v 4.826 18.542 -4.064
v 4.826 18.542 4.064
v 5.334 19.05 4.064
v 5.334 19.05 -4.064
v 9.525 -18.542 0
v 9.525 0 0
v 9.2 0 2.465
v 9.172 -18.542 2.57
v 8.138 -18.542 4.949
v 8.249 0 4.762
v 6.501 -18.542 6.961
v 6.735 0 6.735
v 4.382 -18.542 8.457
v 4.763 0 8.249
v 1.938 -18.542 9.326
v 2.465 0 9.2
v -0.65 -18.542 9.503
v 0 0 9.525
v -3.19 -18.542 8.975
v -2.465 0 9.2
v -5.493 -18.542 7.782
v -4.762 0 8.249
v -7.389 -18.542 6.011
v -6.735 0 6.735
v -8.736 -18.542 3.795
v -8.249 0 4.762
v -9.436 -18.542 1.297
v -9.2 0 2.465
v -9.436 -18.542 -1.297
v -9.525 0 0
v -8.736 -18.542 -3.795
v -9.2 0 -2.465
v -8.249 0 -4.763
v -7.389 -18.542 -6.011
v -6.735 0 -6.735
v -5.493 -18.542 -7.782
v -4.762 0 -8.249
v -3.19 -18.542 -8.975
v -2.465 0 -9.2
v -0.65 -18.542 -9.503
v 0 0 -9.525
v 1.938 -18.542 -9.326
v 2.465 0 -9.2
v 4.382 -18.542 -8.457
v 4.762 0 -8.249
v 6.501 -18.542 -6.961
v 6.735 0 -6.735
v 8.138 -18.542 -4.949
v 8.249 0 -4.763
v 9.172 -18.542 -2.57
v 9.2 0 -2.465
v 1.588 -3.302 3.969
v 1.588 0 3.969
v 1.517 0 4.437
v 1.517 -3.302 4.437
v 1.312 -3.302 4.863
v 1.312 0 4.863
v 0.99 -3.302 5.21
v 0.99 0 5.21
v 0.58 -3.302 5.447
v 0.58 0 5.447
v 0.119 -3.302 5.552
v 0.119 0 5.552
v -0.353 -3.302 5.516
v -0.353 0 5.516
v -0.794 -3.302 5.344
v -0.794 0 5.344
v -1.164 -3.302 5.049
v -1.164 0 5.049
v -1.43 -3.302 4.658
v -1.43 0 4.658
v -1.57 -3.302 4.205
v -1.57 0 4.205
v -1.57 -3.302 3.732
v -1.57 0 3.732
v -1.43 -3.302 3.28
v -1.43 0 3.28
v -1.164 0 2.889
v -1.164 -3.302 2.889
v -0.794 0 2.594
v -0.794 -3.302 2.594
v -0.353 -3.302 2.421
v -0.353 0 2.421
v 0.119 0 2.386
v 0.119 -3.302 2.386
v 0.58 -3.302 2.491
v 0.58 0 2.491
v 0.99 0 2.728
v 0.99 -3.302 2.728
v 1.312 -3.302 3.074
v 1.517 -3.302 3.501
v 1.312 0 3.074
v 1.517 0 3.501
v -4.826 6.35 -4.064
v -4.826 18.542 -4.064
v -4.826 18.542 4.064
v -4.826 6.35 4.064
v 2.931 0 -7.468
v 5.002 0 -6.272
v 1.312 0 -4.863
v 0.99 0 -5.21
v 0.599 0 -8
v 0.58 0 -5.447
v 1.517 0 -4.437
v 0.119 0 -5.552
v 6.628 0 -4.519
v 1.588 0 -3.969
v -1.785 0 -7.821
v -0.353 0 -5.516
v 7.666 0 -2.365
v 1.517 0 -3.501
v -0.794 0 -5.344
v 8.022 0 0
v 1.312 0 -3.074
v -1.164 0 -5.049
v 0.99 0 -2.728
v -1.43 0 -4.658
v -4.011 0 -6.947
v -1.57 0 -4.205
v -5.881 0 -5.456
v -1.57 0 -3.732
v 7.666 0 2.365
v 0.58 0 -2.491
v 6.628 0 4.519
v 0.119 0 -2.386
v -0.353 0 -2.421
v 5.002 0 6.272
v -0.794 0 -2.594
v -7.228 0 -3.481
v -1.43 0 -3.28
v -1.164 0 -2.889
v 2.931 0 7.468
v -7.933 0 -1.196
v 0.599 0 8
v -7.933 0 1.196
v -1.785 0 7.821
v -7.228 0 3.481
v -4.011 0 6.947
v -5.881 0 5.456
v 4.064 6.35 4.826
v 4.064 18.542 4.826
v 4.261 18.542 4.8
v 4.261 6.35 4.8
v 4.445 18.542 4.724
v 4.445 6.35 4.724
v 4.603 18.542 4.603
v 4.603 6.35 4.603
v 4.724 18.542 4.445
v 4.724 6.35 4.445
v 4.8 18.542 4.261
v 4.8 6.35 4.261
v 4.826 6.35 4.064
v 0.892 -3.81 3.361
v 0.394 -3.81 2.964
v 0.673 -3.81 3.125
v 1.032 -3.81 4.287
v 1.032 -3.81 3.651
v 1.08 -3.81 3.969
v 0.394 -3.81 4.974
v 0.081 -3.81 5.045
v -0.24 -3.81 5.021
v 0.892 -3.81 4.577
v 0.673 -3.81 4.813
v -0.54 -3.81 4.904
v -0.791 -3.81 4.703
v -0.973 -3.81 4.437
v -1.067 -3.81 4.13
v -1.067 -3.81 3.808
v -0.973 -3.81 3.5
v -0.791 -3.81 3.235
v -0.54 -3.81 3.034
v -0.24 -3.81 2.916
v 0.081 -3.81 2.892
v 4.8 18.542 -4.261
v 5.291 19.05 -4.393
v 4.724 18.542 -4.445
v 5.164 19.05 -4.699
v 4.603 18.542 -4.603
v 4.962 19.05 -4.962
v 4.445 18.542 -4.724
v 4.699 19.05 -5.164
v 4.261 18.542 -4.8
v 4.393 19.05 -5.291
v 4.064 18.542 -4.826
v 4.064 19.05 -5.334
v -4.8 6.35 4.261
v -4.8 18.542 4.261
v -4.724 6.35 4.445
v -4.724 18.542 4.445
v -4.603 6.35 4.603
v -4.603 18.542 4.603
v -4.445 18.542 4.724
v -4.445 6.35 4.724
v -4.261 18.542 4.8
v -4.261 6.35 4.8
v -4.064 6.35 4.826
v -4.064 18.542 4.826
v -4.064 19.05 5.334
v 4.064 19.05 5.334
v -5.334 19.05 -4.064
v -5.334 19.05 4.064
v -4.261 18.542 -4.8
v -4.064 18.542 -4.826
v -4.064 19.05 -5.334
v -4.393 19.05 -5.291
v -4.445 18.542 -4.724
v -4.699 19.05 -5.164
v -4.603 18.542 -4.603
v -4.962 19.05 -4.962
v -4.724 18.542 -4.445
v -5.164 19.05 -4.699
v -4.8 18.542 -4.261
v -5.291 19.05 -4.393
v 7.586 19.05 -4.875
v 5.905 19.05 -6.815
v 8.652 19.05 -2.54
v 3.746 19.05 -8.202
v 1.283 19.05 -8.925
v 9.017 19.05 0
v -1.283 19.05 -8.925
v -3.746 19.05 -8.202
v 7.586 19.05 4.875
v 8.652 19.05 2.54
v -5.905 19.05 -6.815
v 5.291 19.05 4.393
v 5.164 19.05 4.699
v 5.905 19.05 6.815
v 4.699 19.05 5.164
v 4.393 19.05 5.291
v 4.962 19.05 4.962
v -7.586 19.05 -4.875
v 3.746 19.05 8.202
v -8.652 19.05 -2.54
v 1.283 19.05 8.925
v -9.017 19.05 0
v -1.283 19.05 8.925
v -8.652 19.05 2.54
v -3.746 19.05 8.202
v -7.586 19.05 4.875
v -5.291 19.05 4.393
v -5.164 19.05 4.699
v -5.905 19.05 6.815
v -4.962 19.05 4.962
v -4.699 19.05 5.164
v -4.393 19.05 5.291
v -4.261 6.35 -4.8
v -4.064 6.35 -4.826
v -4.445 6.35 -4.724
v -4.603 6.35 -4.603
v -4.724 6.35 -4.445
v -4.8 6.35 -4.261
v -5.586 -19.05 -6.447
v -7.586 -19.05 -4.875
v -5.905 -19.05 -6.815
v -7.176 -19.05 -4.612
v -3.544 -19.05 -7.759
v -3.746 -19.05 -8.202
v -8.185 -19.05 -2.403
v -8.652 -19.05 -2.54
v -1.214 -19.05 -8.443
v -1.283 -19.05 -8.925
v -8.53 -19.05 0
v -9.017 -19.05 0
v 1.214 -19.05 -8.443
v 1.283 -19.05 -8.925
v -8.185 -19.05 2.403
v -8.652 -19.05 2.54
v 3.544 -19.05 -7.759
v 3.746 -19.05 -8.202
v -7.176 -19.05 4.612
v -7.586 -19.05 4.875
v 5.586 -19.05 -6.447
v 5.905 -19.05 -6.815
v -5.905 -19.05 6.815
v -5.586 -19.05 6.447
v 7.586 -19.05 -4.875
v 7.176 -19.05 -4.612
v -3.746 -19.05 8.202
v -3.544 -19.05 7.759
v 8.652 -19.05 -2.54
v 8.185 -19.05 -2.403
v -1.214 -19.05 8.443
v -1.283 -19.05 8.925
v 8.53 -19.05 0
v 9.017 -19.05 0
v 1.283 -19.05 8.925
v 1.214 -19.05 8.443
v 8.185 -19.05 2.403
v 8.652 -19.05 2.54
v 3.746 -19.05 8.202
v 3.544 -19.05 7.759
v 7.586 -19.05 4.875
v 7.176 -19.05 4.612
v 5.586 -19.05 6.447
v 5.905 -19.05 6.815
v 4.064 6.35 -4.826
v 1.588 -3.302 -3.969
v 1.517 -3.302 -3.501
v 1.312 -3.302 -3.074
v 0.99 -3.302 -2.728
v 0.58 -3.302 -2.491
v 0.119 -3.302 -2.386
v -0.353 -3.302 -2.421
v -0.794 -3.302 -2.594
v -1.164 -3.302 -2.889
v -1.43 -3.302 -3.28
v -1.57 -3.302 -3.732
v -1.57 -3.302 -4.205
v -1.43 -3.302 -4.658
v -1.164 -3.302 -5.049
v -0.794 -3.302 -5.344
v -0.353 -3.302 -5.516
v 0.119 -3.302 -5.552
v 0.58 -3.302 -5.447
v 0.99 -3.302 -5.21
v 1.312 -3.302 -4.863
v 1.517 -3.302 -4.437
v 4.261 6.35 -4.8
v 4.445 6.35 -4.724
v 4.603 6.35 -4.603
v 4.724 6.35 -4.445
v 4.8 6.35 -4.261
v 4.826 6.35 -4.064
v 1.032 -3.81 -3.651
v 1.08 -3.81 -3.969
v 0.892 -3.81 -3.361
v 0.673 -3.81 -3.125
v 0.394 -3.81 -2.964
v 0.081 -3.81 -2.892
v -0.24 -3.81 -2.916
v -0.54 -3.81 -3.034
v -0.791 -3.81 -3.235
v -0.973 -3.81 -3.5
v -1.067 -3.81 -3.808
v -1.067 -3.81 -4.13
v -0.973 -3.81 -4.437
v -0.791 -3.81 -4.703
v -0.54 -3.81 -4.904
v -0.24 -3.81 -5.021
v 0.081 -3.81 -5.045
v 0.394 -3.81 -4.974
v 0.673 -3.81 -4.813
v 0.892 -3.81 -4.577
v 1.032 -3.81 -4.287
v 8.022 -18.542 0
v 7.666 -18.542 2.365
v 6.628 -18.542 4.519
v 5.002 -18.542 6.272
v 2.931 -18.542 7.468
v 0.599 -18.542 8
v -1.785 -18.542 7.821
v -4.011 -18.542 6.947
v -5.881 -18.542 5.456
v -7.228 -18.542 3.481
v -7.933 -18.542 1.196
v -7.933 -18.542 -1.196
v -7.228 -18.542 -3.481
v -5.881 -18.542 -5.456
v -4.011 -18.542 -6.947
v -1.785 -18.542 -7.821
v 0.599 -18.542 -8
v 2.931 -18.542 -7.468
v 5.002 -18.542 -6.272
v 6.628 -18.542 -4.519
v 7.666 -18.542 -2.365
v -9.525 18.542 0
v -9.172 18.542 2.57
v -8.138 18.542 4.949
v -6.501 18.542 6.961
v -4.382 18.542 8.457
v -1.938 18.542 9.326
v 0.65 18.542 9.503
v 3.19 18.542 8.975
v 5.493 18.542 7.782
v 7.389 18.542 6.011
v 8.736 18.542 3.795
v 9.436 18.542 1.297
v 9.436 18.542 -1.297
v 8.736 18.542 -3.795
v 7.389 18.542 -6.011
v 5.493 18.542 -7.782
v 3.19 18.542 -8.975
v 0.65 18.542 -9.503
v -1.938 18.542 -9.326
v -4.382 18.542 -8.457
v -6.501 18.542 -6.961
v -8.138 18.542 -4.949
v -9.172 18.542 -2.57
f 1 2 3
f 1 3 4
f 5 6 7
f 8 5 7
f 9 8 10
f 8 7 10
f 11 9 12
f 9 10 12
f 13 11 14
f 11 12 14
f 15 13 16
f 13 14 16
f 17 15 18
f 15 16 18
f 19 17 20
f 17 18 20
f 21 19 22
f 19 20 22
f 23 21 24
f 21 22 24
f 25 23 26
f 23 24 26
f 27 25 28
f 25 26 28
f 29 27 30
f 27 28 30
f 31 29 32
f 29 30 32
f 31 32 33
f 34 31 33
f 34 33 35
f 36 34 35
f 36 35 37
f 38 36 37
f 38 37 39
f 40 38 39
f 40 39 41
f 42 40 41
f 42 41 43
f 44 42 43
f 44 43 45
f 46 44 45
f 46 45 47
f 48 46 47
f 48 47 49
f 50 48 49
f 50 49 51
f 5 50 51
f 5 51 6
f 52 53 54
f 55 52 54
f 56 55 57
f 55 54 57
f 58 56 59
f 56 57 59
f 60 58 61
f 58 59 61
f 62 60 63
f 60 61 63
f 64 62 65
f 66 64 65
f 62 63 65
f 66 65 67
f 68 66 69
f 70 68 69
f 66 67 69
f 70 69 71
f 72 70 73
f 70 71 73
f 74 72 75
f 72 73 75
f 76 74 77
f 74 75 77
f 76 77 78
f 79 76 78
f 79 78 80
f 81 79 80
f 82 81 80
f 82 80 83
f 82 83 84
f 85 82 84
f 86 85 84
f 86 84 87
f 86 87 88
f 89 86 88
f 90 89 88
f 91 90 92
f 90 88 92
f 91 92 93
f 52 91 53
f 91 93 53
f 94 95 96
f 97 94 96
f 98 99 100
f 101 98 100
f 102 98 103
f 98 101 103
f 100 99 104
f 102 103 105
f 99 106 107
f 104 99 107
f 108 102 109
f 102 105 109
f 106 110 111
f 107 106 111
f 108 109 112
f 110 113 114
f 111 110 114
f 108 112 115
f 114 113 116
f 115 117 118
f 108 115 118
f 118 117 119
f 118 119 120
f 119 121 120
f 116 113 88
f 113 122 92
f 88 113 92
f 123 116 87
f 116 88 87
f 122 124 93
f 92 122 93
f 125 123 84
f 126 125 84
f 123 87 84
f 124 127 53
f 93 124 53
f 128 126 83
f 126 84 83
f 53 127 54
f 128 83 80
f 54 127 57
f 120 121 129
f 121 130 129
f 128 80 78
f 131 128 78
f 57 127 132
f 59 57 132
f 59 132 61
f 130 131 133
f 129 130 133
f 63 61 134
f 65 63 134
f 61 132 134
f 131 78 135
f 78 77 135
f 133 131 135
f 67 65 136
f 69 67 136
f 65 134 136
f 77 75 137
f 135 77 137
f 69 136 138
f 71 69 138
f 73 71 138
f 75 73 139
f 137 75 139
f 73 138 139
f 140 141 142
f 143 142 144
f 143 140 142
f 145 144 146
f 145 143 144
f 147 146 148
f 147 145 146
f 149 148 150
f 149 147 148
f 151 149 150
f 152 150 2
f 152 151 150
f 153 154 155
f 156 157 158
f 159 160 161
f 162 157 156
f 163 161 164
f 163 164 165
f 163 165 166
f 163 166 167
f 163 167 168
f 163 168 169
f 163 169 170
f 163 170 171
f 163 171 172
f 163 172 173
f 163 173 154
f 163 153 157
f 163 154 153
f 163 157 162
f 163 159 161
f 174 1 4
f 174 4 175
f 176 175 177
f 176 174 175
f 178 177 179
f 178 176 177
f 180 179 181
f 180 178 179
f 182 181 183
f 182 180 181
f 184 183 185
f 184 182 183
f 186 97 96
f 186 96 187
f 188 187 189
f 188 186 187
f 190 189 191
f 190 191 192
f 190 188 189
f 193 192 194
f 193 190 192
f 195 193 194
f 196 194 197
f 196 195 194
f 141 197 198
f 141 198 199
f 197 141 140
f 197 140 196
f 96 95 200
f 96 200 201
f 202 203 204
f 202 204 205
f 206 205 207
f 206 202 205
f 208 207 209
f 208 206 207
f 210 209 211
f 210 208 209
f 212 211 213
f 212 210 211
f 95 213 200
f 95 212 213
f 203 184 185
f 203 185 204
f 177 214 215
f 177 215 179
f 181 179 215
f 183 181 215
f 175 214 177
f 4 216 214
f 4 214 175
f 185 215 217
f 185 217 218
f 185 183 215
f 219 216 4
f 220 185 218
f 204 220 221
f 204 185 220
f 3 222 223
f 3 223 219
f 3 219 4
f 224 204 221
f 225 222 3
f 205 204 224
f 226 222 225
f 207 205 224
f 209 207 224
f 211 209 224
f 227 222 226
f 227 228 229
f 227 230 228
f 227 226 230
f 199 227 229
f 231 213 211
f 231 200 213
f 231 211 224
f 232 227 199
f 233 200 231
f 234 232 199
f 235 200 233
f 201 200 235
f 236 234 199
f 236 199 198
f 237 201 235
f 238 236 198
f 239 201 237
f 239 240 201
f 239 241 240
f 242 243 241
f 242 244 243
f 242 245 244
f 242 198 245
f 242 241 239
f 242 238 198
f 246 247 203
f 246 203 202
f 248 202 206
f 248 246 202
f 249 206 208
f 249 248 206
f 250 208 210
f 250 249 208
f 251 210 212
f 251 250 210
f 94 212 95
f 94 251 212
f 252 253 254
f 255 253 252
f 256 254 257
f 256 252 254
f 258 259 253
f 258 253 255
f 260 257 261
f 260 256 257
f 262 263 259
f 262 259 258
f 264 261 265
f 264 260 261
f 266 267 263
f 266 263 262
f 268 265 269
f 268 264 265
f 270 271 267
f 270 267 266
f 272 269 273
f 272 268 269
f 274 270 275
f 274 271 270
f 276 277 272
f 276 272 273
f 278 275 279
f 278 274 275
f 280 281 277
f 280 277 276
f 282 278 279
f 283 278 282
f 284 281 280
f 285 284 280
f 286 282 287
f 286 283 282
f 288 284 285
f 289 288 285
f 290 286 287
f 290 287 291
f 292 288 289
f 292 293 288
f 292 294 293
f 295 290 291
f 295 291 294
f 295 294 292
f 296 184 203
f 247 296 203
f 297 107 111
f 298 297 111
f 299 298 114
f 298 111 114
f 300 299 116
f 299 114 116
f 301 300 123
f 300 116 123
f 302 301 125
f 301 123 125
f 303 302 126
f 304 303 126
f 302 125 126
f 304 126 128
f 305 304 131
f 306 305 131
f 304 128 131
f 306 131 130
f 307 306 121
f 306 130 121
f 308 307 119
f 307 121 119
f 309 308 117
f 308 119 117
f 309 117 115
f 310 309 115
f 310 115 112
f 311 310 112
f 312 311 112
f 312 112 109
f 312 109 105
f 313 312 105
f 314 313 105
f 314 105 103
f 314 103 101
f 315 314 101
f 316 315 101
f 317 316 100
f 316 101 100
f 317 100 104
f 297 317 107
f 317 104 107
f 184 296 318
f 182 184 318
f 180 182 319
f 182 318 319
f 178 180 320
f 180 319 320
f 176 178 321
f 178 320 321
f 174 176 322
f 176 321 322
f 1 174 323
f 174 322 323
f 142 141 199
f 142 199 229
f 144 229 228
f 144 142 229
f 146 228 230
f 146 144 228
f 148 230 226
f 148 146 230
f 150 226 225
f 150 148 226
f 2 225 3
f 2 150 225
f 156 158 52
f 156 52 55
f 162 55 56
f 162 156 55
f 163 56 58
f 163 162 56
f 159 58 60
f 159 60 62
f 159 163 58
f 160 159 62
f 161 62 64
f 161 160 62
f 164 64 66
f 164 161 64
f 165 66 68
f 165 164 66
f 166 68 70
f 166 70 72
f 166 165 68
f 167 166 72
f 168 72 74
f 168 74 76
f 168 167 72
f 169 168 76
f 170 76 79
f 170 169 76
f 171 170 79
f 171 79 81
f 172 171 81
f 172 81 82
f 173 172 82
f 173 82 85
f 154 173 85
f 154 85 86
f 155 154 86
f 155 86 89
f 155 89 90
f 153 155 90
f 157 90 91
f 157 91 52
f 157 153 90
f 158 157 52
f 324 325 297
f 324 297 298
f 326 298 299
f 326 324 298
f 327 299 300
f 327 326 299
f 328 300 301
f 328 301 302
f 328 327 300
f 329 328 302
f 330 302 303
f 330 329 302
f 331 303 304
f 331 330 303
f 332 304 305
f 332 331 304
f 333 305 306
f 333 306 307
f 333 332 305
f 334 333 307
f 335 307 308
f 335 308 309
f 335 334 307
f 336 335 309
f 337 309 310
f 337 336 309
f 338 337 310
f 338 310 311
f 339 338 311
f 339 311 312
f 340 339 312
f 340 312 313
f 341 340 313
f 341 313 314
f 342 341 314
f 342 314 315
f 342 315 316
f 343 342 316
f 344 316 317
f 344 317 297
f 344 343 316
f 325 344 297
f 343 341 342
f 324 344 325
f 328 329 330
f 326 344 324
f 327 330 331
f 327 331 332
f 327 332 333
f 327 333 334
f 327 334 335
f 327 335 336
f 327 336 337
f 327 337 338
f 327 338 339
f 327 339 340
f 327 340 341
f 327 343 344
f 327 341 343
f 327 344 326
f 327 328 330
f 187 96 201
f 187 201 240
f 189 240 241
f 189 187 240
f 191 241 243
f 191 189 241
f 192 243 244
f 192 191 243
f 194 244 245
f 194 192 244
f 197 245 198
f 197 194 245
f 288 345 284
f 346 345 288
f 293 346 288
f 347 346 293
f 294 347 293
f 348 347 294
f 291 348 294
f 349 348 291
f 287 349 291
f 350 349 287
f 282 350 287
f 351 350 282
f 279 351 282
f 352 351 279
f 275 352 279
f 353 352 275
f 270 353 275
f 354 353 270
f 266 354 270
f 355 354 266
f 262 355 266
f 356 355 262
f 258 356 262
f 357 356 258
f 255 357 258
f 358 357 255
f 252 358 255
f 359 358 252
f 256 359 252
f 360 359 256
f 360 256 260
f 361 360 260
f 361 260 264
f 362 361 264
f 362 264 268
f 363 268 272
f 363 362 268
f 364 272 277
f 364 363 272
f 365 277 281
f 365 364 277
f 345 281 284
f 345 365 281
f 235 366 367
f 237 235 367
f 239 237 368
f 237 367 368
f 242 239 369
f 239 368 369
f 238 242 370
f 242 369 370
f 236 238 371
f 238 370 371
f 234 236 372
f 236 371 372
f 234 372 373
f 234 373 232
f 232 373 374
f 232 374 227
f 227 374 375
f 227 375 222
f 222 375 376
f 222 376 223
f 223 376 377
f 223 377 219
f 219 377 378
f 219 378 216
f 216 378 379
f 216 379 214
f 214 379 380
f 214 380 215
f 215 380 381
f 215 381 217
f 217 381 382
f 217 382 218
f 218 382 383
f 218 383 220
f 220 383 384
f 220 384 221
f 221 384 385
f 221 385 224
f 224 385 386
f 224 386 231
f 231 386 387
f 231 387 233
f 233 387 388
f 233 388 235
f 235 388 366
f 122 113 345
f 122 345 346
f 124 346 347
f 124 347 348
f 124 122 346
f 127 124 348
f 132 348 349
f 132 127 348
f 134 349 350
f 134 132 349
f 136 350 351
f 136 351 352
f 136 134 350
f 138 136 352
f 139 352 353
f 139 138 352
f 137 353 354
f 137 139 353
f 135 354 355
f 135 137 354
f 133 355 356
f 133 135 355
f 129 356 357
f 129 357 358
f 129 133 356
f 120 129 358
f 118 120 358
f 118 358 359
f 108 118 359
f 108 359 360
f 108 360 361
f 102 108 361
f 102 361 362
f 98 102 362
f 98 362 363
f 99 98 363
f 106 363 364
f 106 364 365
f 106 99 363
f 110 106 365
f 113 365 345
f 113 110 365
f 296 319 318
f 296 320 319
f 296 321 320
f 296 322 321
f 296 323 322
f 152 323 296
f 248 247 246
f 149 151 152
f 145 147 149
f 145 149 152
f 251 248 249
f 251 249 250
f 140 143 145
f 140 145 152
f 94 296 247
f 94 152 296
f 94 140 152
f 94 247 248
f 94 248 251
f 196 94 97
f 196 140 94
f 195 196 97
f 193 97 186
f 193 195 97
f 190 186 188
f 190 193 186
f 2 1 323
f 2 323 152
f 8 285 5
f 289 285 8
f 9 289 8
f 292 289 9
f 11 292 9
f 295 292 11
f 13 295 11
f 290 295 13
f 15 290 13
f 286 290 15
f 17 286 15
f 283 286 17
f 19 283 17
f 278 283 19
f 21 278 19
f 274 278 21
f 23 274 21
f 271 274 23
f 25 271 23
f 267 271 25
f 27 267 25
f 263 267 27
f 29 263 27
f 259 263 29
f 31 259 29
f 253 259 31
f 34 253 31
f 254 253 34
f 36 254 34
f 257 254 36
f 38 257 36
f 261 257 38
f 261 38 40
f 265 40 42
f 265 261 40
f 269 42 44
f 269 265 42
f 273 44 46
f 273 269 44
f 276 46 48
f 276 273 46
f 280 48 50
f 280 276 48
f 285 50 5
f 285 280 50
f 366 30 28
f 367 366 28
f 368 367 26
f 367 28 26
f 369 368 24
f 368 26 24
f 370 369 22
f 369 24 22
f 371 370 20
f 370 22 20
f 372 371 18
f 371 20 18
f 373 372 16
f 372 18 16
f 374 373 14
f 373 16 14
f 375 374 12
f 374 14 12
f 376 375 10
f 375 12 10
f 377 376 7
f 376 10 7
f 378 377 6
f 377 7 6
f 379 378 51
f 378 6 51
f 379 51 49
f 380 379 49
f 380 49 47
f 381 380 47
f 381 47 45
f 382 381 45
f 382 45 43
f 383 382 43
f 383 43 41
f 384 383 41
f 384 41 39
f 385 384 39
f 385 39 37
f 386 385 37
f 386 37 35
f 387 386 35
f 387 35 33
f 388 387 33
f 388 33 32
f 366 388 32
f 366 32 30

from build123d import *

# Parameters (mm, degrees)
F0_R     = 1.5875
F1_DEPTH = 3.81
F2_R     = 9.525
F2_R_2   = 8.0221390402
F3_DEPTH = 19.05
F4_R     = 9.525
F5_DEPTH = 19.05
F6_W     = 9.652
F6_H     = 9.652
F7_DEPTH = 12.7
F8_R     = 0.762
F9_SIZE  = 0.508


with BuildPart() as f1:
    # F0 (on Front) → F1 (new body)
    with BuildSketch(Plane.XZ):
        with Locations((0, 3.96875)):
            Circle(F0_R)
    extrude(amount=F1_DEPTH)



with BuildPart() as f1b:
    # F0 (on Front) → F1, piece 2 (new body)
    with BuildSketch(Plane.XZ):
        with Locations((0, -3.96875)):
            Circle(F0_R)
    extrude(amount=F1_DEPTH)


with BuildPart() as f3:
    # F2 (on face) → F3 (new body)
    with BuildSketch(Plane.XZ):
        Circle(F2_R)
        Circle(F2_R_2, mode=Mode.SUBTRACT)
    extrude(amount=F3_DEPTH)


with BuildPart() as f1_1:
    add(f1.part)

    add(f1b.part)  # F5 merges F1b

    add(f3.part)  # F5 merges F3
    # F4 (on face) → F5 (join)
    with BuildSketch(Plane(origin=(0, 0, 0), x_dir=(-1, 0, 0), z_dir=(0, 1, 0))):
        Circle(F4_R)
    extrude(amount=F5_DEPTH)

    # F6 (on face) → F7 (cut)
    with BuildSketch(Plane(origin=(0, 19.05, 0), x_dir=(-1, 0, 0), z_dir=(0, 1, 0))):
        Rectangle(F6_W, F6_H)
    extrude(amount=-F7_DEPTH, mode=Mode.SUBTRACT)

    # F8
    f8_edges = [f1_1.edges().sort_by_distance(p)[0] for p in [
        (-4.826, 12.7, -4.826),
        (-4.826, 12.7, 4.826),
        (4.826, 12.7, 4.826),
        (4.826, 12.7, -4.826),
    ]]
    fillet(f8_edges, radius=F8_R)

    # F9
    f9_edges = [f1_1.edges().sort_by_distance(p)[0] for p in [
        (0, 19.05, -4.826),
        (9.525, 19.05, 0),
        (-9.525, -19.05, 0),
        (-8.022139, -19.05, 0),
        (-1.5875, -3.81, 3.96875),
        (-1.5875, -3.81, -3.96875),
    ]]
    chamfer(f9_edges, length=F9_SIZE)


solid = f1_1.part
